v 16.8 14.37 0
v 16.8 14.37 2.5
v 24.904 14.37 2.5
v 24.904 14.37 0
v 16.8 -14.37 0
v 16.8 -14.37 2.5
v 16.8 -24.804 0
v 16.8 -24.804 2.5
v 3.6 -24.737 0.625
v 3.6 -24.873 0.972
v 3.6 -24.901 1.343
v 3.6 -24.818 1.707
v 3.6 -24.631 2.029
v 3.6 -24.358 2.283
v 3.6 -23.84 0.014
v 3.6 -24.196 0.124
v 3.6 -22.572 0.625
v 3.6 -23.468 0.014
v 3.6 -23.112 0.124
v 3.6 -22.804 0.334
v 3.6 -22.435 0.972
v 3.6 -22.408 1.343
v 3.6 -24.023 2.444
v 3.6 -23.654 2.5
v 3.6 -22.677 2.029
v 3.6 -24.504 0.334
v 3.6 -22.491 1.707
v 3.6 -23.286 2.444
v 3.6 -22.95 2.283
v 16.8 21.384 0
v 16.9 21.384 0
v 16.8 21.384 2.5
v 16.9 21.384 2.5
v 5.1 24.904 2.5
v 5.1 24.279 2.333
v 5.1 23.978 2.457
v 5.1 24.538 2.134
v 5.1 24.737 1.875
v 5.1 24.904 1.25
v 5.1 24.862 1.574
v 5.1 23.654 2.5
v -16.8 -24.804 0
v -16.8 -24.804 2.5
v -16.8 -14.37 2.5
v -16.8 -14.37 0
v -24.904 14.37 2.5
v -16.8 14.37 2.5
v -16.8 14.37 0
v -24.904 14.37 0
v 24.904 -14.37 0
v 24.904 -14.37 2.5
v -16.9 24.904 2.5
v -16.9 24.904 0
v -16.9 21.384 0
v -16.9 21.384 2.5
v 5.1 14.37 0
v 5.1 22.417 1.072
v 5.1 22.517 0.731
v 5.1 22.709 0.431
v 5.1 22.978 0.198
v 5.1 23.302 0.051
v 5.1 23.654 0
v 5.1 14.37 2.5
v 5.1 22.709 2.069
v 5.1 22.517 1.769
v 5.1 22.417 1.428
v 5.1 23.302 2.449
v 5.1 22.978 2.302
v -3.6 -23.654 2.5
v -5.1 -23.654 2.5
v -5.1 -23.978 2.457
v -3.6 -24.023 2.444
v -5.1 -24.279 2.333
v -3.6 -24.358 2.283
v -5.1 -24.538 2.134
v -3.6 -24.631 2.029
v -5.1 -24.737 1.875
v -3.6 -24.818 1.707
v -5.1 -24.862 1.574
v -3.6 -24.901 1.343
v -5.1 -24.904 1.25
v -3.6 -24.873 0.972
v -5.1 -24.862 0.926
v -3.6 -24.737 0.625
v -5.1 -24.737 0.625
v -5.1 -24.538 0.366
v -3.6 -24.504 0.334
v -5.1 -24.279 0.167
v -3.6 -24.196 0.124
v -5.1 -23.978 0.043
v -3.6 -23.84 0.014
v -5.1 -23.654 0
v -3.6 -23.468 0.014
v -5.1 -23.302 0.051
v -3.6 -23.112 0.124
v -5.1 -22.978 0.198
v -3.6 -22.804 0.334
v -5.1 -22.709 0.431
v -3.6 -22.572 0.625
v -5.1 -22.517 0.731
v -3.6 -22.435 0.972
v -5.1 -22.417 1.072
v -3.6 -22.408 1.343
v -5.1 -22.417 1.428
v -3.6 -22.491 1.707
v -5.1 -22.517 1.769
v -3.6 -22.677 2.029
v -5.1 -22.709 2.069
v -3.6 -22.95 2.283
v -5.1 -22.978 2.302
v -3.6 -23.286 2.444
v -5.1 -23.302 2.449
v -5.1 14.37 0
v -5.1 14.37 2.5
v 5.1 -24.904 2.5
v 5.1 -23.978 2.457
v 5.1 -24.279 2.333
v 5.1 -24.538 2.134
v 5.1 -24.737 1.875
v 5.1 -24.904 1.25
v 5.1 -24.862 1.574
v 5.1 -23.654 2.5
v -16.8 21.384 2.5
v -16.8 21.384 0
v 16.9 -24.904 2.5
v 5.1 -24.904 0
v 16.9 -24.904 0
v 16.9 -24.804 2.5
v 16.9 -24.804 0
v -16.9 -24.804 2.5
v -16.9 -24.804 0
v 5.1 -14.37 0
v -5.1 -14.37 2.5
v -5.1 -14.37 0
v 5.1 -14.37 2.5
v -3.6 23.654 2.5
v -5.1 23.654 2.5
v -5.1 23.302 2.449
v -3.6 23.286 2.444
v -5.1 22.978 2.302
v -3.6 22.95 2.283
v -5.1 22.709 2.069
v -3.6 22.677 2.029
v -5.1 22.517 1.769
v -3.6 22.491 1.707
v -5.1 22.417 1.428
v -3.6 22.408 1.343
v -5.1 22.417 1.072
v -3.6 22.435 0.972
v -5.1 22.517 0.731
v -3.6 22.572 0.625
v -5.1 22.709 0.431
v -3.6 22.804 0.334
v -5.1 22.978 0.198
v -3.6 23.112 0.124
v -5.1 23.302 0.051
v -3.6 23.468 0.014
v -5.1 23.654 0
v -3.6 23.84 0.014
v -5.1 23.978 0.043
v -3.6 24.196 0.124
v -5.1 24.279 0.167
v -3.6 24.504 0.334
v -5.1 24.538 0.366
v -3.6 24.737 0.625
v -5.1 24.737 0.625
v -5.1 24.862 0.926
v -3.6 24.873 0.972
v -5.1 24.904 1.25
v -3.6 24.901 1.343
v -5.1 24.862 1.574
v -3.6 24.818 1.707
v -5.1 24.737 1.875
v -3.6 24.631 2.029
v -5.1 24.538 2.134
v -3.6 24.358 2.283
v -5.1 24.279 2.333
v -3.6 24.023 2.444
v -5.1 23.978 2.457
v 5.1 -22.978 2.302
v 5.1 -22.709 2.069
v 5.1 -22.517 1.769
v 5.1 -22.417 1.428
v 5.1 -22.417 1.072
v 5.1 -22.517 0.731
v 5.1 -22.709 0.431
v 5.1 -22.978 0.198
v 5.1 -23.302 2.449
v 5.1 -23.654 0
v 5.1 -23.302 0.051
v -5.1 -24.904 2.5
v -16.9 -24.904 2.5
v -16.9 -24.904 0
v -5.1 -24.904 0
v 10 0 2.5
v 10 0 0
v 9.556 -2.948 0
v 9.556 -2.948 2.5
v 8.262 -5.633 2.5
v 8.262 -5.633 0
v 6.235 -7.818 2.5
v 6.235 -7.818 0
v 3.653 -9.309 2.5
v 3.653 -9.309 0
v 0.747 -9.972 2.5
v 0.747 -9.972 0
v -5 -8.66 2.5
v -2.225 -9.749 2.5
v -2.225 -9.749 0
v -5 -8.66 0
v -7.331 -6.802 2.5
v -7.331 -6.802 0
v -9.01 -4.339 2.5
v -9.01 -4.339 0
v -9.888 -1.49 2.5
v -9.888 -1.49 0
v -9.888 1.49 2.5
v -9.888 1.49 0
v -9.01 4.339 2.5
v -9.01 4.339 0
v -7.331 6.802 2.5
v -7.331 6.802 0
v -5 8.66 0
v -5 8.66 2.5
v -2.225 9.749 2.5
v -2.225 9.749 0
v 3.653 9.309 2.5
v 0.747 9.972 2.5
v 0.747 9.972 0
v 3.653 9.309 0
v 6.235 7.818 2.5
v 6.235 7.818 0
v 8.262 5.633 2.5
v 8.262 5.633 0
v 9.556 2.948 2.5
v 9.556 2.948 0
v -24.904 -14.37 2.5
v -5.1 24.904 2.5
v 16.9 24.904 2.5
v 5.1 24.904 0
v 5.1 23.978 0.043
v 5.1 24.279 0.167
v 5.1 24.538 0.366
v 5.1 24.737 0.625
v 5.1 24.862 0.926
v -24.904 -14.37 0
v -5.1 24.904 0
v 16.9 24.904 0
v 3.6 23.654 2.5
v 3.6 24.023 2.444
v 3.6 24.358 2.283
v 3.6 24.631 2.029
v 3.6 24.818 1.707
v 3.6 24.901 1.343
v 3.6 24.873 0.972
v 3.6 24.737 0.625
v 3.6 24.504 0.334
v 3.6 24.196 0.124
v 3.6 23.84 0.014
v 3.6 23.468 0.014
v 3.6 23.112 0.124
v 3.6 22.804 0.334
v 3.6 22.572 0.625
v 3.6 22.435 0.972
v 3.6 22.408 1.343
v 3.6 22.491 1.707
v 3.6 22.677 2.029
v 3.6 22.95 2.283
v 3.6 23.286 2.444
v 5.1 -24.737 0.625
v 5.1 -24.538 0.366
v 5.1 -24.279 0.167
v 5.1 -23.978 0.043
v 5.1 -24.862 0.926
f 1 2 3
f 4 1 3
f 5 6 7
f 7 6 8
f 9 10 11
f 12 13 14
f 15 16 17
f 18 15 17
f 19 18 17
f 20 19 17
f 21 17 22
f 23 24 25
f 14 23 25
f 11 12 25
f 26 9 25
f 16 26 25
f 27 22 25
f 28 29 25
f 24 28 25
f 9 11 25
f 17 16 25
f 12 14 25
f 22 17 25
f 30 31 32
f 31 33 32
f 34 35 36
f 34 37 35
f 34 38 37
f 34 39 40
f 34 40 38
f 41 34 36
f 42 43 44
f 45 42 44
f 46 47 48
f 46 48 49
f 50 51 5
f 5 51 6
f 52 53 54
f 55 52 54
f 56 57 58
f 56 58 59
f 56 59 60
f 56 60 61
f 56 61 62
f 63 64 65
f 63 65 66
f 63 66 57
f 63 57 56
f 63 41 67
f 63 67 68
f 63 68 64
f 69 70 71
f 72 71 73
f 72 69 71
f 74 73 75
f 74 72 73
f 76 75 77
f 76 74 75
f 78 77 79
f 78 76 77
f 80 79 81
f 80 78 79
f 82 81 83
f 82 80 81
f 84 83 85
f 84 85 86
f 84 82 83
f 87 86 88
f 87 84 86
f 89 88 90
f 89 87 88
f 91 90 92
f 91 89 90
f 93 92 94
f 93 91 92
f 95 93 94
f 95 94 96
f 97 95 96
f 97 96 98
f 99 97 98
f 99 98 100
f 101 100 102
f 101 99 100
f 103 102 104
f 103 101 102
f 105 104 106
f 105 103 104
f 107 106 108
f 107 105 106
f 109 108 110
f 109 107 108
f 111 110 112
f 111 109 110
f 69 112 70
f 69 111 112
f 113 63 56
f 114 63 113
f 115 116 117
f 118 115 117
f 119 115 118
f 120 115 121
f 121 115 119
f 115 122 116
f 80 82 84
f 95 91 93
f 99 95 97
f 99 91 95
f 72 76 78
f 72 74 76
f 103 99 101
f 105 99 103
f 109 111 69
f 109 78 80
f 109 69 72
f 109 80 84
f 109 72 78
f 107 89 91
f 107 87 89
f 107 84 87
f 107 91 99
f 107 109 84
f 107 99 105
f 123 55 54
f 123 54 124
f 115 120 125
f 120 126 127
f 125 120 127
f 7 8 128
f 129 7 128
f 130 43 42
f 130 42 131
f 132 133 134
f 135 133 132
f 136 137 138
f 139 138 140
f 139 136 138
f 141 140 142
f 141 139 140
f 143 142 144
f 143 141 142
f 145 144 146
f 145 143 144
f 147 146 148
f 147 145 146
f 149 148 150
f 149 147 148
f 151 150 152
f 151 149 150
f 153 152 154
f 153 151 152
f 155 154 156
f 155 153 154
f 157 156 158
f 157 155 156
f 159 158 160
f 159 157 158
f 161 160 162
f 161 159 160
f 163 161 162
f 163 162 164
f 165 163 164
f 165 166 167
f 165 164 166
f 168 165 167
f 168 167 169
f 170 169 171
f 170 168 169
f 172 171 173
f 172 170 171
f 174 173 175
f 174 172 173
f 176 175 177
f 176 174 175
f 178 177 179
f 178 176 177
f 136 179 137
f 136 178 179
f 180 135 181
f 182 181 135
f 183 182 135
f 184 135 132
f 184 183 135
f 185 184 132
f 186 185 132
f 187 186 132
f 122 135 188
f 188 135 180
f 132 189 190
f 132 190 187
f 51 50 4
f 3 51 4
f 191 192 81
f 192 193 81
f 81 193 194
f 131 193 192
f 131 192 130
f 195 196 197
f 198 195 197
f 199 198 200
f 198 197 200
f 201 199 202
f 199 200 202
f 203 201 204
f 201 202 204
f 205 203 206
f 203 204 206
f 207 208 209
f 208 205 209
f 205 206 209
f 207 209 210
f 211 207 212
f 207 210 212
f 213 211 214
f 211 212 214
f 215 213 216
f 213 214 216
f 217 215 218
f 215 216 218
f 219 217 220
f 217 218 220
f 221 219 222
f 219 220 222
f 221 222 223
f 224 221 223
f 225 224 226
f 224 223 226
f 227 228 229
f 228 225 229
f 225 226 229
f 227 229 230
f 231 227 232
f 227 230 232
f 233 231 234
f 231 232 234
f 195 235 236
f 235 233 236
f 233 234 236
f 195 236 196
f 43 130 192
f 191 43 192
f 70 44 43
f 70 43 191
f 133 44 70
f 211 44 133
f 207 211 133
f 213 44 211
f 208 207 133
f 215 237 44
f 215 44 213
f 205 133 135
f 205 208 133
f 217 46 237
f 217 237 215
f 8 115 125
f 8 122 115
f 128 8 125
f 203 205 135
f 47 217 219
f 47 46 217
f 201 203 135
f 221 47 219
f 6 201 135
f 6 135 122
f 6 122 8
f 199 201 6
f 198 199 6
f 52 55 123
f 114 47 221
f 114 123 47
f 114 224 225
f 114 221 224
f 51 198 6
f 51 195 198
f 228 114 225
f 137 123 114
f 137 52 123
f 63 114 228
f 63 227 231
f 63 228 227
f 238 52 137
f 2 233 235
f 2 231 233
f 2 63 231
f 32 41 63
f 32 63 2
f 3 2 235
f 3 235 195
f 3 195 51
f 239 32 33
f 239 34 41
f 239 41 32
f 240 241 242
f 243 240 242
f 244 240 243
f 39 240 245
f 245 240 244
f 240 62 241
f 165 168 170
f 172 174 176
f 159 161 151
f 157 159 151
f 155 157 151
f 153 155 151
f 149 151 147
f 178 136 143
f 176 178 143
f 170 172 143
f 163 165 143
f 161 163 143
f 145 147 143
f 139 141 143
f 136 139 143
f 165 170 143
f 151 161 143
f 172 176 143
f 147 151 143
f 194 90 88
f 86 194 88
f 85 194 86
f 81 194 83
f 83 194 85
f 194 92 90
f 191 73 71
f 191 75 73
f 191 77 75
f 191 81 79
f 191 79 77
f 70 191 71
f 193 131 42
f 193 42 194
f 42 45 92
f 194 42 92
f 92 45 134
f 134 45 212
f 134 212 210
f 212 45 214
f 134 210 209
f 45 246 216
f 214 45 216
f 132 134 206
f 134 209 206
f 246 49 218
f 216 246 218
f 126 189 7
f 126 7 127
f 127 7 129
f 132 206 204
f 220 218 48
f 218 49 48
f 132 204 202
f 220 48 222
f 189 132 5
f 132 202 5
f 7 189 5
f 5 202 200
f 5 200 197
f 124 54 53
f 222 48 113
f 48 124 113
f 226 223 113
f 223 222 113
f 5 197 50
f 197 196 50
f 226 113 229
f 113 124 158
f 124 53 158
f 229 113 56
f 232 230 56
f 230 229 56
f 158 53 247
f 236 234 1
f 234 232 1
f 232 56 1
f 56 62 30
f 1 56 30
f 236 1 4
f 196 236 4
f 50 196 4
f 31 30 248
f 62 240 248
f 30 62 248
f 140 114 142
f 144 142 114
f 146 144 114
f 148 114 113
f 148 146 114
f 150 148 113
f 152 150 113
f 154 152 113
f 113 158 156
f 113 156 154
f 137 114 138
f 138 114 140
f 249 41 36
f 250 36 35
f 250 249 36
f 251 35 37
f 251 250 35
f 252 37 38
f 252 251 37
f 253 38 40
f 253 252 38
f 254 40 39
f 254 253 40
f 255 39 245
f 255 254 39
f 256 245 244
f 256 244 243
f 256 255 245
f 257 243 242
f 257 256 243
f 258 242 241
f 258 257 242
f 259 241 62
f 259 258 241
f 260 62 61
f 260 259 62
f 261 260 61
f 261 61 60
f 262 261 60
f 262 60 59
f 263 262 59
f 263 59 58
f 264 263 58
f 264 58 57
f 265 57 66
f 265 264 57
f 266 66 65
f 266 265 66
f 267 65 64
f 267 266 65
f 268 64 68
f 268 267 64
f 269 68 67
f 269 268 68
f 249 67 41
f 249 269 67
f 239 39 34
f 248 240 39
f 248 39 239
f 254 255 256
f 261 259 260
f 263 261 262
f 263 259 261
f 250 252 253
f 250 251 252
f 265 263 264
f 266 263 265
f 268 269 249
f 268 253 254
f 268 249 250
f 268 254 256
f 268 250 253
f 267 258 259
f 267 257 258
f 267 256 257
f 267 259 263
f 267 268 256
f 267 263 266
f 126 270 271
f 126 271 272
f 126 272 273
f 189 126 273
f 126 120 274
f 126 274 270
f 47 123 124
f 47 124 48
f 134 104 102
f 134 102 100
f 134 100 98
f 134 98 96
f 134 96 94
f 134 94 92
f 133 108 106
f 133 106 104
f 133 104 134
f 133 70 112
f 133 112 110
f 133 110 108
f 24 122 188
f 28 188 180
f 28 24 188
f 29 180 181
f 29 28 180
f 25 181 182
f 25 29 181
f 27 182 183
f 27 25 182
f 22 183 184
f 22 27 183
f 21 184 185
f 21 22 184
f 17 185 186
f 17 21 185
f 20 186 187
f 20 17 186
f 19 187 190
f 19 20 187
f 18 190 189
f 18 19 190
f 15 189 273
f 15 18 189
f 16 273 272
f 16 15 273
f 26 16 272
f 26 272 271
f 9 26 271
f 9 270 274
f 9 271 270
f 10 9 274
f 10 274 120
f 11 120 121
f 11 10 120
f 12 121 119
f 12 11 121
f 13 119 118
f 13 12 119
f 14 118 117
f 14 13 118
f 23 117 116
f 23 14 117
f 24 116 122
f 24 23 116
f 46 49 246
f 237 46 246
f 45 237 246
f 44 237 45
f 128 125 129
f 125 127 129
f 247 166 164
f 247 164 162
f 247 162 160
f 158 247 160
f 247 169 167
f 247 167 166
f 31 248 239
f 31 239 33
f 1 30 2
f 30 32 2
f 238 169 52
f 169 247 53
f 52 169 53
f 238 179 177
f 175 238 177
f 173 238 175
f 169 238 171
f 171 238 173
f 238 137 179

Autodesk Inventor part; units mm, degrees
ref_plane "YZ Plane" through (0, 0, 0) normal (1, 0, 0) x (0, 1, 0)
ref_plane "XZ Plane" through (0, 0, 0) normal (0, 1, 0) x (-1, 0, 0)
ref_plane "XY Plane" through (0, 0, 0) normal (0, 0, 1) x (1, 0, 0)
sketch "Skizze1" plane through (0, 0, 0) normal (0, 0, 1) x (1, 0, 0)
  line L0 (0, -42.3366) -> (0, 42.3366) construction
  line L1 (-38.4382, 0) -> (56.3005, 0) construction
  line L2 (0, 0) -> (30.2404, 30.2404) construction
  line L3 (0, 0) -> (42.7664, 0) construction
  line L4 (0, 24.9041) -> (16.9, 24.9041)
  line L5 (16.9, 24.9041) -> (16.9, 21.2841)
  line L6 (16.9, 21.2841) -> (19.092, 19.092)
  line L7 (24.9041, 0) -> (24.9041, 16.9)
  line L8 (24.9041, 16.9) -> (21.2841, 16.9)
  line L9 (21.2841, 16.9) -> (19.092, 19.092)
  line L10 (0, 24.9041) -> (-16.9, 24.9041)
  line L11 (-16.9, 24.9041) -> (-16.9, 21.2841)
  line L12 (-16.9, 21.2841) -> (-19.092, 19.092)
  line L13 (-24.9041, 0) -> (-24.9041, 16.9)
  line L14 (-24.9041, 16.9) -> (-21.2841, 16.9)
  line L15 (-21.2841, 16.9) -> (-19.092, 19.092)
  line L16 (0, 0) -> (30.2404, -30.2404) construction
  line L17 (0, -24.9041) -> (16.9, -24.9041)
  line L18 (16.9, -24.9041) -> (16.9, -21.2841)
  line L19 (16.9, -21.2841) -> (19.092, -19.092)
  line L20 (24.9041, 0) -> (24.9041, -16.9)
  line L21 (24.9041, -16.9) -> (21.2841, -16.9)
  line L22 (21.2841, -16.9) -> (19.092, -19.092)
  line L23 (0, -24.9041) -> (-16.9, -24.9041)
  line L24 (-16.9, -24.9041) -> (-16.9, -21.2841)
  line L25 (-16.9, -21.2841) -> (-19.092, -19.092)
  line L26 (-24.9041, 0) -> (-24.9041, -16.9)
  line L27 (-24.9041, -16.9) -> (-21.2841, -16.9)
  line L28 (-21.2841, -16.9) -> (-19.092, -19.092)
  circle A0 centre (0, 0) radius 10
  dimension "d0" = 45
  dimension "d1" = 16.9
  dimension "d2" = 3.1
  dimension "d3" = 3.62
  dimension "d4" = 20
extrude "Extrusion1" add sketch "Skizze1" along normal blind 2.5
sketch "Skizze2" plane through (0, 0, 2.5) normal (0, 0, 1) x (1, 0, 0)
  line L0 (17.3243, 16.97) -> (5, 16.97) construction
  line L1 (17.3243, 16.97) -> (17.3243, 14.47) construction
  line L2 (5, 14.47) -> (17.3243, 14.47) construction
  line L3 (5, 16.97) -> (5, 14.47) construction
  line L4 (-5, 16.97) -> (-17.3243, 16.97) construction
  line L5 (-5, 16.97) -> (-5, 14.47) construction
  line L6 (-17.3243, 14.47) -> (-5, 14.47) construction
  line L7 (-17.3243, 16.97) -> (-17.3243, 14.47) construction
  circle A0 centre (0, 0) radius 10 construction
  line L8 (16.9, 24.9041) -> (-16.9, 24.9041) construction
  line L9 (-16.9, 24.9041) -> (-16.9, 21.2841) construction
  line L10 (-16.9, 21.2841) -> (-21.2841, 16.9) construction
  line L11 (-21.2841, 16.9) -> (-24.9041, 16.9) construction
  line L12 (-24.9041, 16.9) -> (-24.9041, -16.9) construction
  line L13 (-24.9041, -16.9) -> (-21.2841, -16.9) construction
  line L14 (-21.2841, -16.9) -> (-16.9, -21.2841) construction
  line L15 (-16.9, -21.2841) -> (-16.9, -24.9041) construction
  line L16 (-16.9, -24.9041) -> (16.9, -24.9041) construction
  line L17 (16.9, -24.9041) -> (16.9, -21.2841) construction
  line L18 (16.9, -21.2841) -> (21.2841, -16.9) construction
  line L19 (21.2841, -16.9) -> (24.9041, -16.9) construction
  line L20 (24.9041, -16.9) -> (24.9041, 16.9) construction
  line L21 (24.9041, 16.9) -> (21.2841, 16.9) construction
  line L22 (21.2841, 16.9) -> (16.9, 21.2841) construction
  line L23 (16.9, 21.2841) -> (16.9, 24.9041) construction
  line L24 (-5, 14.47) -> (5, 14.47) construction
  line L25 (5, 14.47) -> (5, 24.9041) construction
  line L26 (5, 24.9041) -> (-5, 24.9041) construction
  line L27 (-5, 24.9041) -> (-5, 14.47) construction
  line L28 (-16.9, 21.2841) -> (-21.2841, 16.9) construction
  line L29 (-16.9, 21.2841) -> (-24.9041, 21.2841) construction
  line L30 (-24.9041, 21.2841) -> (-24.9041, 14.47) construction
  line L31 (-24.9041, 14.47) -> (-16.9, 14.47) construction
  line L32 (-16.9, 14.47) -> (-16.9, 21.2841) construction
  line L33 (0, -34.8857) -> (0, 34.9857) construction
  line L34 (-24.9041, 16.9) -> (-24.9041, -16.9) construction
  line L35 (17.3243, 16.97) -> (17.3243, 14.47) construction
  line L36 (16.9, 21.2841) -> (21.2841, 16.9) construction
  line L37 (21.2841, 16.9) -> (24.9041, 16.9) construction
  line L38 (16.9, 21.2841) -> (21.2841, 16.9) construction
  line L39 (16.9, 21.2841) -> (24.9041, 21.2841) construction
  line L40 (24.9041, 21.2841) -> (24.9041, 14.47) construction
  line L41 (24.9041, 14.47) -> (16.9, 14.47) construction
  line L42 (16.9, 14.47) -> (16.9, 21.2841) construction
  line L43 (16.8, 14.37) -> (25.0041, 14.37)
  line L44 (25.0041, 14.37) -> (25.0041, 21.3841)
  line L45 (25.0041, 21.3841) -> (16.8, 21.3841)
  line L46 (16.8, 21.3841) -> (16.8, 14.37)
  line L47 (-16.8, 14.37) -> (-25.0041, 14.37)
  line L48 (-25.0041, 14.37) -> (-25.0041, 21.3841)
  line L49 (-25.0041, 21.3841) -> (-16.8, 21.3841)
  line L50 (-16.8, 21.3841) -> (-16.8, 14.37)
  line L51 (16.9, 24.9041) -> (-16.9, 24.9041) construction
  line L52 (-5, 14.47) -> (5, 14.47) construction
  line L53 (5, 14.47) -> (5, 24.9041) construction
  line L54 (5, 24.9041) -> (-5, 24.9041) construction
  line L55 (-5, 24.9041) -> (-5, 14.47) construction
  line L56 (5.1, 25.0041) -> (5.1, 14.37)
  line L57 (5.1, 14.37) -> (-5.1, 14.37)
  line L58 (-5.1, 14.37) -> (-5.1, 25.0041)
  line L59 (-5.1, 25.0041) -> (5.1, 25.0041)
  dimension "d8" = 0.1
  dimension "d9" = 0.1
  dimension "d15" = 10
  dimension "d16" = 0.1
extrude "Extrusion2" cut sketch "Skizze2" against normal through all
sketch "Skizze3" plane through (0, 0, 2.5) normal (0, 0, 1) x (1, 0, 0)
  line L0 (16.8, 21.3841) -> (16.9, 21.3841) construction
  line L1 (16.9, 21.3841) -> (16.9, 24.9041) construction
  line L2 (-5.1, 24.9041) -> (-16.9, 24.9041) construction
  line L3 (16.9, 24.9041) -> (5.1, 24.9041) construction
  line L4 (-16.9, 24.9041) -> (-16.9, 21.3841) construction
  line L5 (-16.9, 21.3841) -> (-16.8, 21.3841) construction
  line L6 (-16.8, 21.3841) -> (-16.8, 14.37) construction
  line L7 (-16.8, 14.37) -> (-24.9041, 14.37) construction
  line L8 (-24.9041, 14.37) -> (-24.9041, -16.9) construction
  line L9 (-24.9041, -16.9) -> (-21.2841, -16.9) projected
  line L10 (-21.2841, -16.9) -> (-16.9, -21.2841) projected
  line L11 (-16.9, -21.2841) -> (-16.9, -24.9041) projected
  line L12 (-16.9, -24.9041) -> (16.9, -24.9041) construction
  line L13 (16.9, -24.9041) -> (16.9, -21.2841) projected
  line L14 (16.9, -21.2841) -> (21.2841, -16.9) projected
  line L15 (21.2841, -16.9) -> (24.9041, -16.9) projected
  line L16 (24.9041, -16.9) -> (24.9041, 14.37) construction
  line L17 (24.9041, 14.37) -> (16.8, 14.37) construction
  line L18 (16.8, 14.37) -> (16.8, 21.3841) construction
  circle A0 centre (0, 0) radius 10 construction
  line L19 (24.8041, -16.8) -> (21.2426, -16.8)
  line L20 (21.2426, -16.8) -> (16.8, -21.2426)
  line L21 (16.8, -21.2426) -> (16.8, -24.8041)
  line L22 (16.8, -24.8041) -> (-16.8, -24.8041) construction
  line L23 (-16.8, -24.8041) -> (-16.8, -21.2426)
  line L24 (-16.8, -21.2426) -> (-21.2426, -16.8)
  line L25 (-21.2426, -16.8) -> (-24.8041, -16.8)
  line L26 (-24.8041, -16.8) -> (-24.8041, 14.27) construction
  line L27 (-24.8041, 14.27) -> (-16.7, 14.27) construction
  line L28 (-16.7, 14.27) -> (-16.7, 21.4841) construction
  line L29 (-16.7, 21.4841) -> (-16.8, 21.4841) construction
  line L30 (-16.8, 21.4841) -> (-16.8, 24.8041) construction
  line L31 (-16.8, 24.8041) -> (-2.7, 24.8041) construction
  line L32 (-2.7, 24.8041) -> (-2.7, 14.27) construction
  line L33 (-2.7, 14.27) -> (2.7, 14.27) construction
  line L34 (2.7, 14.27) -> (2.7, 24.8041) construction
  line L35 (2.7, 24.8041) -> (16.8, 24.8041) construction
  line L36 (16.8, 24.8041) -> (16.8, 21.4841) construction
  line L37 (16.8, 21.4841) -> (16.7, 21.4841) construction
  line L38 (16.7, 21.4841) -> (16.7, 14.27) construction
  line L39 (16.7, 14.27) -> (24.8041, 14.27) construction
  line L40 (24.8041, 14.27) -> (24.8041, -16.8) construction
  line L41 (-24.8041, -16.8) -> (-24.8041, -16.9)
  line L42 (-16.8, -24.8041) -> (-16.9, -24.8041)
  line L43 (16.8, -24.8041) -> (16.9, -24.8041)
  line L44 (24.8041, -16.8) -> (24.8041, -16.9)
  line L45 (5.1, 24.9041) -> (5.1, 14.37) projected
  line L46 (5.1, 14.37) -> (-5.1, 14.37) projected
  line L47 (-5.1, 14.37) -> (-5.1, 24.9041) projected
  dimension "d12" = 0.1
extrude "Extrusion3" cut sketch "Skizze3" against normal up to surface (2.5 mm away)
mirror "Spiegeln1" about plane through (0, 0, 0) normal (0, 1, 0) of "Extrusion2"
ref_plane "Arbeitsebene1" through (0, 0, 1.25) normal (0, 0, 1) x (1, 0, 0)
sketch "Skizze4" plane through (0, 0, 2.5) normal (0, 0, 1) x (1, 0, 0)
  circle A0 centre (0, 0) radius 10 construction
  line L0 (-24.9041, -14.37) -> (-16.8, -14.37) construction
  line L1 (-16.8, -14.37) -> (-16.8, -24.8041) construction
  line L2 (-16.8, -24.8041) -> (-16.9, -24.8041) construction
  line L3 (-16.9, -24.8041) -> (-16.9, -24.9041) construction
  line L4 (-16.9, -24.9041) -> (-5.1, -24.9041) construction
  line L5 (-5.1, -24.9041) -> (-5.1, -14.37) construction
  line L6 (-5.1, -14.37) -> (5.1, -14.37) construction
  line L7 (5.1, -14.37) -> (5.1, -24.9041) construction
  line L8 (5.1, -24.9041) -> (16.9, -24.9041) construction
  line L9 (16.9, -24.9041) -> (16.9, -24.8041) construction
  line L10 (16.9, -24.8041) -> (16.8, -24.8041) construction
  line L11 (16.8, -24.8041) -> (16.8, -14.37) construction
  line L12 (16.8, -14.37) -> (24.9041, -14.37) construction
  line L13 (24.9041, -14.37) -> (24.9041, 14.37) construction
  line L14 (24.9041, 14.37) -> (16.8, 14.37) construction
  line L15 (16.8, 14.37) -> (16.8, 21.3841) construction
  line L16 (16.8, 21.3841) -> (16.9, 21.3841) construction
  line L17 (16.9, 21.3841) -> (16.9, 24.9041) construction
  line L18 (16.9, 24.9041) -> (5.1, 24.9041) construction
  line L19 (5.1, 24.9041) -> (5.1, 14.37) construction
  line L20 (5.1, 14.37) -> (-5.1, 14.37) construction
  line L21 (-5.1, 14.37) -> (-5.1, 24.9041) construction
  line L22 (-5.1, 24.9041) -> (-16.9, 24.9041) construction
  line L23 (-16.9, 24.9041) -> (-16.9, 21.3841) construction
  line L24 (-16.9, 21.3841) -> (-16.8, 21.3841) construction
  line L25 (-16.8, 21.3841) -> (-16.8, 14.37) construction
  line L26 (-16.8, 14.37) -> (-24.9041, 14.37) construction
  line L27 (-24.9041, 14.37) -> (-24.9041, -14.37) construction
  line L28 (5.1, 24.9041) -> (3.6, 24.9041)
  line L29 (3.6, 24.9041) -> (3.6, 22.4041)
  line L30 (3.6, 22.4041) -> (5.1, 22.4041)
  line L31 (5.1, 22.4041) -> (5.1, 24.9041)
  line L32 (-34.8657, 0) -> (34.8657, 0) construction
  line L33 (0, 34.8657) -> (0, -34.8657) construction
  line L34 (5.1, -24.9041) -> (3.6, -24.9041)
  line L35 (3.6, -24.9041) -> (3.6, -22.4041)
  line L36 (3.6, -22.4041) -> (5.1, -22.4041)
  line L37 (5.1, -22.4041) -> (5.1, -24.9041)
  line L38 (-5.1, 24.9041) -> (-3.6, 24.9041)
  line L39 (-3.6, 24.9041) -> (-3.6, 22.4041)
  line L40 (-3.6, 22.4041) -> (-5.1, 22.4041)
  line L41 (-5.1, 22.4041) -> (-5.1, 24.9041)
  line L42 (-3.6, -22.4041) -> (-5.1, -22.4041)
  line L43 (-3.6, -24.9041) -> (-3.6, -22.4041)
  line L44 (-5.1, -24.9041) -> (-3.6, -24.9041)
  line L45 (-5.1, -22.4041) -> (-5.1, -24.9041)
  dimension "d18" = 2.5
  dimension "d19" = 1.5
extrude "Extrusion4" add sketch "Skizze4" against normal up to surface (2.5 mm away)
sketch "Skizze5" plane through (3.6, 22.4041, 2.5) normal (-1, 0, 0) x (0, 0, 1)
  line L0 (-2.5, 0) -> (-2.5, 2.5) construction
  line L1 (0, 0) -> (-2.5, 0) construction
  line L2 (0, 2.5) -> (0, 0) construction
  line L3 (0, 2.5) -> (-2.5, 2.5) construction
  circle A0 centre (-1.25, 1.25) radius 1.25
  line L4 (-1.25, 12.4616) -> (-1.25, -57.2697) projected
  line L5 (0, 2.5) -> (-2.5, 2.5)
  line L6 (-2.5, 2.5) -> (-2.5, 0)
  line L7 (-2.5, 0) -> (0, 0)
  line L8 (0, 0) -> (0, 2.5)
  point P0 (-2.5, -22.4041)
extrude "Extrusion5" cut sketch "Skizze5" against normal up to surface (1.5 mm away) contours L8 L7 A0 | A0 L5 L8 | A0 L6 L5 | L7 L6 A0
mirror "Spiegeln2" about plane through (0, 0, 0) normal (0, 1, 0) of "Extrusion5"
mirror "Spiegeln3" about plane through (0, 0, 0) normal (1, 0, 0) of "Extrusion5", "Spiegeln2"
properties part number "20_Cube_Insert_focusing_holder_v3"
